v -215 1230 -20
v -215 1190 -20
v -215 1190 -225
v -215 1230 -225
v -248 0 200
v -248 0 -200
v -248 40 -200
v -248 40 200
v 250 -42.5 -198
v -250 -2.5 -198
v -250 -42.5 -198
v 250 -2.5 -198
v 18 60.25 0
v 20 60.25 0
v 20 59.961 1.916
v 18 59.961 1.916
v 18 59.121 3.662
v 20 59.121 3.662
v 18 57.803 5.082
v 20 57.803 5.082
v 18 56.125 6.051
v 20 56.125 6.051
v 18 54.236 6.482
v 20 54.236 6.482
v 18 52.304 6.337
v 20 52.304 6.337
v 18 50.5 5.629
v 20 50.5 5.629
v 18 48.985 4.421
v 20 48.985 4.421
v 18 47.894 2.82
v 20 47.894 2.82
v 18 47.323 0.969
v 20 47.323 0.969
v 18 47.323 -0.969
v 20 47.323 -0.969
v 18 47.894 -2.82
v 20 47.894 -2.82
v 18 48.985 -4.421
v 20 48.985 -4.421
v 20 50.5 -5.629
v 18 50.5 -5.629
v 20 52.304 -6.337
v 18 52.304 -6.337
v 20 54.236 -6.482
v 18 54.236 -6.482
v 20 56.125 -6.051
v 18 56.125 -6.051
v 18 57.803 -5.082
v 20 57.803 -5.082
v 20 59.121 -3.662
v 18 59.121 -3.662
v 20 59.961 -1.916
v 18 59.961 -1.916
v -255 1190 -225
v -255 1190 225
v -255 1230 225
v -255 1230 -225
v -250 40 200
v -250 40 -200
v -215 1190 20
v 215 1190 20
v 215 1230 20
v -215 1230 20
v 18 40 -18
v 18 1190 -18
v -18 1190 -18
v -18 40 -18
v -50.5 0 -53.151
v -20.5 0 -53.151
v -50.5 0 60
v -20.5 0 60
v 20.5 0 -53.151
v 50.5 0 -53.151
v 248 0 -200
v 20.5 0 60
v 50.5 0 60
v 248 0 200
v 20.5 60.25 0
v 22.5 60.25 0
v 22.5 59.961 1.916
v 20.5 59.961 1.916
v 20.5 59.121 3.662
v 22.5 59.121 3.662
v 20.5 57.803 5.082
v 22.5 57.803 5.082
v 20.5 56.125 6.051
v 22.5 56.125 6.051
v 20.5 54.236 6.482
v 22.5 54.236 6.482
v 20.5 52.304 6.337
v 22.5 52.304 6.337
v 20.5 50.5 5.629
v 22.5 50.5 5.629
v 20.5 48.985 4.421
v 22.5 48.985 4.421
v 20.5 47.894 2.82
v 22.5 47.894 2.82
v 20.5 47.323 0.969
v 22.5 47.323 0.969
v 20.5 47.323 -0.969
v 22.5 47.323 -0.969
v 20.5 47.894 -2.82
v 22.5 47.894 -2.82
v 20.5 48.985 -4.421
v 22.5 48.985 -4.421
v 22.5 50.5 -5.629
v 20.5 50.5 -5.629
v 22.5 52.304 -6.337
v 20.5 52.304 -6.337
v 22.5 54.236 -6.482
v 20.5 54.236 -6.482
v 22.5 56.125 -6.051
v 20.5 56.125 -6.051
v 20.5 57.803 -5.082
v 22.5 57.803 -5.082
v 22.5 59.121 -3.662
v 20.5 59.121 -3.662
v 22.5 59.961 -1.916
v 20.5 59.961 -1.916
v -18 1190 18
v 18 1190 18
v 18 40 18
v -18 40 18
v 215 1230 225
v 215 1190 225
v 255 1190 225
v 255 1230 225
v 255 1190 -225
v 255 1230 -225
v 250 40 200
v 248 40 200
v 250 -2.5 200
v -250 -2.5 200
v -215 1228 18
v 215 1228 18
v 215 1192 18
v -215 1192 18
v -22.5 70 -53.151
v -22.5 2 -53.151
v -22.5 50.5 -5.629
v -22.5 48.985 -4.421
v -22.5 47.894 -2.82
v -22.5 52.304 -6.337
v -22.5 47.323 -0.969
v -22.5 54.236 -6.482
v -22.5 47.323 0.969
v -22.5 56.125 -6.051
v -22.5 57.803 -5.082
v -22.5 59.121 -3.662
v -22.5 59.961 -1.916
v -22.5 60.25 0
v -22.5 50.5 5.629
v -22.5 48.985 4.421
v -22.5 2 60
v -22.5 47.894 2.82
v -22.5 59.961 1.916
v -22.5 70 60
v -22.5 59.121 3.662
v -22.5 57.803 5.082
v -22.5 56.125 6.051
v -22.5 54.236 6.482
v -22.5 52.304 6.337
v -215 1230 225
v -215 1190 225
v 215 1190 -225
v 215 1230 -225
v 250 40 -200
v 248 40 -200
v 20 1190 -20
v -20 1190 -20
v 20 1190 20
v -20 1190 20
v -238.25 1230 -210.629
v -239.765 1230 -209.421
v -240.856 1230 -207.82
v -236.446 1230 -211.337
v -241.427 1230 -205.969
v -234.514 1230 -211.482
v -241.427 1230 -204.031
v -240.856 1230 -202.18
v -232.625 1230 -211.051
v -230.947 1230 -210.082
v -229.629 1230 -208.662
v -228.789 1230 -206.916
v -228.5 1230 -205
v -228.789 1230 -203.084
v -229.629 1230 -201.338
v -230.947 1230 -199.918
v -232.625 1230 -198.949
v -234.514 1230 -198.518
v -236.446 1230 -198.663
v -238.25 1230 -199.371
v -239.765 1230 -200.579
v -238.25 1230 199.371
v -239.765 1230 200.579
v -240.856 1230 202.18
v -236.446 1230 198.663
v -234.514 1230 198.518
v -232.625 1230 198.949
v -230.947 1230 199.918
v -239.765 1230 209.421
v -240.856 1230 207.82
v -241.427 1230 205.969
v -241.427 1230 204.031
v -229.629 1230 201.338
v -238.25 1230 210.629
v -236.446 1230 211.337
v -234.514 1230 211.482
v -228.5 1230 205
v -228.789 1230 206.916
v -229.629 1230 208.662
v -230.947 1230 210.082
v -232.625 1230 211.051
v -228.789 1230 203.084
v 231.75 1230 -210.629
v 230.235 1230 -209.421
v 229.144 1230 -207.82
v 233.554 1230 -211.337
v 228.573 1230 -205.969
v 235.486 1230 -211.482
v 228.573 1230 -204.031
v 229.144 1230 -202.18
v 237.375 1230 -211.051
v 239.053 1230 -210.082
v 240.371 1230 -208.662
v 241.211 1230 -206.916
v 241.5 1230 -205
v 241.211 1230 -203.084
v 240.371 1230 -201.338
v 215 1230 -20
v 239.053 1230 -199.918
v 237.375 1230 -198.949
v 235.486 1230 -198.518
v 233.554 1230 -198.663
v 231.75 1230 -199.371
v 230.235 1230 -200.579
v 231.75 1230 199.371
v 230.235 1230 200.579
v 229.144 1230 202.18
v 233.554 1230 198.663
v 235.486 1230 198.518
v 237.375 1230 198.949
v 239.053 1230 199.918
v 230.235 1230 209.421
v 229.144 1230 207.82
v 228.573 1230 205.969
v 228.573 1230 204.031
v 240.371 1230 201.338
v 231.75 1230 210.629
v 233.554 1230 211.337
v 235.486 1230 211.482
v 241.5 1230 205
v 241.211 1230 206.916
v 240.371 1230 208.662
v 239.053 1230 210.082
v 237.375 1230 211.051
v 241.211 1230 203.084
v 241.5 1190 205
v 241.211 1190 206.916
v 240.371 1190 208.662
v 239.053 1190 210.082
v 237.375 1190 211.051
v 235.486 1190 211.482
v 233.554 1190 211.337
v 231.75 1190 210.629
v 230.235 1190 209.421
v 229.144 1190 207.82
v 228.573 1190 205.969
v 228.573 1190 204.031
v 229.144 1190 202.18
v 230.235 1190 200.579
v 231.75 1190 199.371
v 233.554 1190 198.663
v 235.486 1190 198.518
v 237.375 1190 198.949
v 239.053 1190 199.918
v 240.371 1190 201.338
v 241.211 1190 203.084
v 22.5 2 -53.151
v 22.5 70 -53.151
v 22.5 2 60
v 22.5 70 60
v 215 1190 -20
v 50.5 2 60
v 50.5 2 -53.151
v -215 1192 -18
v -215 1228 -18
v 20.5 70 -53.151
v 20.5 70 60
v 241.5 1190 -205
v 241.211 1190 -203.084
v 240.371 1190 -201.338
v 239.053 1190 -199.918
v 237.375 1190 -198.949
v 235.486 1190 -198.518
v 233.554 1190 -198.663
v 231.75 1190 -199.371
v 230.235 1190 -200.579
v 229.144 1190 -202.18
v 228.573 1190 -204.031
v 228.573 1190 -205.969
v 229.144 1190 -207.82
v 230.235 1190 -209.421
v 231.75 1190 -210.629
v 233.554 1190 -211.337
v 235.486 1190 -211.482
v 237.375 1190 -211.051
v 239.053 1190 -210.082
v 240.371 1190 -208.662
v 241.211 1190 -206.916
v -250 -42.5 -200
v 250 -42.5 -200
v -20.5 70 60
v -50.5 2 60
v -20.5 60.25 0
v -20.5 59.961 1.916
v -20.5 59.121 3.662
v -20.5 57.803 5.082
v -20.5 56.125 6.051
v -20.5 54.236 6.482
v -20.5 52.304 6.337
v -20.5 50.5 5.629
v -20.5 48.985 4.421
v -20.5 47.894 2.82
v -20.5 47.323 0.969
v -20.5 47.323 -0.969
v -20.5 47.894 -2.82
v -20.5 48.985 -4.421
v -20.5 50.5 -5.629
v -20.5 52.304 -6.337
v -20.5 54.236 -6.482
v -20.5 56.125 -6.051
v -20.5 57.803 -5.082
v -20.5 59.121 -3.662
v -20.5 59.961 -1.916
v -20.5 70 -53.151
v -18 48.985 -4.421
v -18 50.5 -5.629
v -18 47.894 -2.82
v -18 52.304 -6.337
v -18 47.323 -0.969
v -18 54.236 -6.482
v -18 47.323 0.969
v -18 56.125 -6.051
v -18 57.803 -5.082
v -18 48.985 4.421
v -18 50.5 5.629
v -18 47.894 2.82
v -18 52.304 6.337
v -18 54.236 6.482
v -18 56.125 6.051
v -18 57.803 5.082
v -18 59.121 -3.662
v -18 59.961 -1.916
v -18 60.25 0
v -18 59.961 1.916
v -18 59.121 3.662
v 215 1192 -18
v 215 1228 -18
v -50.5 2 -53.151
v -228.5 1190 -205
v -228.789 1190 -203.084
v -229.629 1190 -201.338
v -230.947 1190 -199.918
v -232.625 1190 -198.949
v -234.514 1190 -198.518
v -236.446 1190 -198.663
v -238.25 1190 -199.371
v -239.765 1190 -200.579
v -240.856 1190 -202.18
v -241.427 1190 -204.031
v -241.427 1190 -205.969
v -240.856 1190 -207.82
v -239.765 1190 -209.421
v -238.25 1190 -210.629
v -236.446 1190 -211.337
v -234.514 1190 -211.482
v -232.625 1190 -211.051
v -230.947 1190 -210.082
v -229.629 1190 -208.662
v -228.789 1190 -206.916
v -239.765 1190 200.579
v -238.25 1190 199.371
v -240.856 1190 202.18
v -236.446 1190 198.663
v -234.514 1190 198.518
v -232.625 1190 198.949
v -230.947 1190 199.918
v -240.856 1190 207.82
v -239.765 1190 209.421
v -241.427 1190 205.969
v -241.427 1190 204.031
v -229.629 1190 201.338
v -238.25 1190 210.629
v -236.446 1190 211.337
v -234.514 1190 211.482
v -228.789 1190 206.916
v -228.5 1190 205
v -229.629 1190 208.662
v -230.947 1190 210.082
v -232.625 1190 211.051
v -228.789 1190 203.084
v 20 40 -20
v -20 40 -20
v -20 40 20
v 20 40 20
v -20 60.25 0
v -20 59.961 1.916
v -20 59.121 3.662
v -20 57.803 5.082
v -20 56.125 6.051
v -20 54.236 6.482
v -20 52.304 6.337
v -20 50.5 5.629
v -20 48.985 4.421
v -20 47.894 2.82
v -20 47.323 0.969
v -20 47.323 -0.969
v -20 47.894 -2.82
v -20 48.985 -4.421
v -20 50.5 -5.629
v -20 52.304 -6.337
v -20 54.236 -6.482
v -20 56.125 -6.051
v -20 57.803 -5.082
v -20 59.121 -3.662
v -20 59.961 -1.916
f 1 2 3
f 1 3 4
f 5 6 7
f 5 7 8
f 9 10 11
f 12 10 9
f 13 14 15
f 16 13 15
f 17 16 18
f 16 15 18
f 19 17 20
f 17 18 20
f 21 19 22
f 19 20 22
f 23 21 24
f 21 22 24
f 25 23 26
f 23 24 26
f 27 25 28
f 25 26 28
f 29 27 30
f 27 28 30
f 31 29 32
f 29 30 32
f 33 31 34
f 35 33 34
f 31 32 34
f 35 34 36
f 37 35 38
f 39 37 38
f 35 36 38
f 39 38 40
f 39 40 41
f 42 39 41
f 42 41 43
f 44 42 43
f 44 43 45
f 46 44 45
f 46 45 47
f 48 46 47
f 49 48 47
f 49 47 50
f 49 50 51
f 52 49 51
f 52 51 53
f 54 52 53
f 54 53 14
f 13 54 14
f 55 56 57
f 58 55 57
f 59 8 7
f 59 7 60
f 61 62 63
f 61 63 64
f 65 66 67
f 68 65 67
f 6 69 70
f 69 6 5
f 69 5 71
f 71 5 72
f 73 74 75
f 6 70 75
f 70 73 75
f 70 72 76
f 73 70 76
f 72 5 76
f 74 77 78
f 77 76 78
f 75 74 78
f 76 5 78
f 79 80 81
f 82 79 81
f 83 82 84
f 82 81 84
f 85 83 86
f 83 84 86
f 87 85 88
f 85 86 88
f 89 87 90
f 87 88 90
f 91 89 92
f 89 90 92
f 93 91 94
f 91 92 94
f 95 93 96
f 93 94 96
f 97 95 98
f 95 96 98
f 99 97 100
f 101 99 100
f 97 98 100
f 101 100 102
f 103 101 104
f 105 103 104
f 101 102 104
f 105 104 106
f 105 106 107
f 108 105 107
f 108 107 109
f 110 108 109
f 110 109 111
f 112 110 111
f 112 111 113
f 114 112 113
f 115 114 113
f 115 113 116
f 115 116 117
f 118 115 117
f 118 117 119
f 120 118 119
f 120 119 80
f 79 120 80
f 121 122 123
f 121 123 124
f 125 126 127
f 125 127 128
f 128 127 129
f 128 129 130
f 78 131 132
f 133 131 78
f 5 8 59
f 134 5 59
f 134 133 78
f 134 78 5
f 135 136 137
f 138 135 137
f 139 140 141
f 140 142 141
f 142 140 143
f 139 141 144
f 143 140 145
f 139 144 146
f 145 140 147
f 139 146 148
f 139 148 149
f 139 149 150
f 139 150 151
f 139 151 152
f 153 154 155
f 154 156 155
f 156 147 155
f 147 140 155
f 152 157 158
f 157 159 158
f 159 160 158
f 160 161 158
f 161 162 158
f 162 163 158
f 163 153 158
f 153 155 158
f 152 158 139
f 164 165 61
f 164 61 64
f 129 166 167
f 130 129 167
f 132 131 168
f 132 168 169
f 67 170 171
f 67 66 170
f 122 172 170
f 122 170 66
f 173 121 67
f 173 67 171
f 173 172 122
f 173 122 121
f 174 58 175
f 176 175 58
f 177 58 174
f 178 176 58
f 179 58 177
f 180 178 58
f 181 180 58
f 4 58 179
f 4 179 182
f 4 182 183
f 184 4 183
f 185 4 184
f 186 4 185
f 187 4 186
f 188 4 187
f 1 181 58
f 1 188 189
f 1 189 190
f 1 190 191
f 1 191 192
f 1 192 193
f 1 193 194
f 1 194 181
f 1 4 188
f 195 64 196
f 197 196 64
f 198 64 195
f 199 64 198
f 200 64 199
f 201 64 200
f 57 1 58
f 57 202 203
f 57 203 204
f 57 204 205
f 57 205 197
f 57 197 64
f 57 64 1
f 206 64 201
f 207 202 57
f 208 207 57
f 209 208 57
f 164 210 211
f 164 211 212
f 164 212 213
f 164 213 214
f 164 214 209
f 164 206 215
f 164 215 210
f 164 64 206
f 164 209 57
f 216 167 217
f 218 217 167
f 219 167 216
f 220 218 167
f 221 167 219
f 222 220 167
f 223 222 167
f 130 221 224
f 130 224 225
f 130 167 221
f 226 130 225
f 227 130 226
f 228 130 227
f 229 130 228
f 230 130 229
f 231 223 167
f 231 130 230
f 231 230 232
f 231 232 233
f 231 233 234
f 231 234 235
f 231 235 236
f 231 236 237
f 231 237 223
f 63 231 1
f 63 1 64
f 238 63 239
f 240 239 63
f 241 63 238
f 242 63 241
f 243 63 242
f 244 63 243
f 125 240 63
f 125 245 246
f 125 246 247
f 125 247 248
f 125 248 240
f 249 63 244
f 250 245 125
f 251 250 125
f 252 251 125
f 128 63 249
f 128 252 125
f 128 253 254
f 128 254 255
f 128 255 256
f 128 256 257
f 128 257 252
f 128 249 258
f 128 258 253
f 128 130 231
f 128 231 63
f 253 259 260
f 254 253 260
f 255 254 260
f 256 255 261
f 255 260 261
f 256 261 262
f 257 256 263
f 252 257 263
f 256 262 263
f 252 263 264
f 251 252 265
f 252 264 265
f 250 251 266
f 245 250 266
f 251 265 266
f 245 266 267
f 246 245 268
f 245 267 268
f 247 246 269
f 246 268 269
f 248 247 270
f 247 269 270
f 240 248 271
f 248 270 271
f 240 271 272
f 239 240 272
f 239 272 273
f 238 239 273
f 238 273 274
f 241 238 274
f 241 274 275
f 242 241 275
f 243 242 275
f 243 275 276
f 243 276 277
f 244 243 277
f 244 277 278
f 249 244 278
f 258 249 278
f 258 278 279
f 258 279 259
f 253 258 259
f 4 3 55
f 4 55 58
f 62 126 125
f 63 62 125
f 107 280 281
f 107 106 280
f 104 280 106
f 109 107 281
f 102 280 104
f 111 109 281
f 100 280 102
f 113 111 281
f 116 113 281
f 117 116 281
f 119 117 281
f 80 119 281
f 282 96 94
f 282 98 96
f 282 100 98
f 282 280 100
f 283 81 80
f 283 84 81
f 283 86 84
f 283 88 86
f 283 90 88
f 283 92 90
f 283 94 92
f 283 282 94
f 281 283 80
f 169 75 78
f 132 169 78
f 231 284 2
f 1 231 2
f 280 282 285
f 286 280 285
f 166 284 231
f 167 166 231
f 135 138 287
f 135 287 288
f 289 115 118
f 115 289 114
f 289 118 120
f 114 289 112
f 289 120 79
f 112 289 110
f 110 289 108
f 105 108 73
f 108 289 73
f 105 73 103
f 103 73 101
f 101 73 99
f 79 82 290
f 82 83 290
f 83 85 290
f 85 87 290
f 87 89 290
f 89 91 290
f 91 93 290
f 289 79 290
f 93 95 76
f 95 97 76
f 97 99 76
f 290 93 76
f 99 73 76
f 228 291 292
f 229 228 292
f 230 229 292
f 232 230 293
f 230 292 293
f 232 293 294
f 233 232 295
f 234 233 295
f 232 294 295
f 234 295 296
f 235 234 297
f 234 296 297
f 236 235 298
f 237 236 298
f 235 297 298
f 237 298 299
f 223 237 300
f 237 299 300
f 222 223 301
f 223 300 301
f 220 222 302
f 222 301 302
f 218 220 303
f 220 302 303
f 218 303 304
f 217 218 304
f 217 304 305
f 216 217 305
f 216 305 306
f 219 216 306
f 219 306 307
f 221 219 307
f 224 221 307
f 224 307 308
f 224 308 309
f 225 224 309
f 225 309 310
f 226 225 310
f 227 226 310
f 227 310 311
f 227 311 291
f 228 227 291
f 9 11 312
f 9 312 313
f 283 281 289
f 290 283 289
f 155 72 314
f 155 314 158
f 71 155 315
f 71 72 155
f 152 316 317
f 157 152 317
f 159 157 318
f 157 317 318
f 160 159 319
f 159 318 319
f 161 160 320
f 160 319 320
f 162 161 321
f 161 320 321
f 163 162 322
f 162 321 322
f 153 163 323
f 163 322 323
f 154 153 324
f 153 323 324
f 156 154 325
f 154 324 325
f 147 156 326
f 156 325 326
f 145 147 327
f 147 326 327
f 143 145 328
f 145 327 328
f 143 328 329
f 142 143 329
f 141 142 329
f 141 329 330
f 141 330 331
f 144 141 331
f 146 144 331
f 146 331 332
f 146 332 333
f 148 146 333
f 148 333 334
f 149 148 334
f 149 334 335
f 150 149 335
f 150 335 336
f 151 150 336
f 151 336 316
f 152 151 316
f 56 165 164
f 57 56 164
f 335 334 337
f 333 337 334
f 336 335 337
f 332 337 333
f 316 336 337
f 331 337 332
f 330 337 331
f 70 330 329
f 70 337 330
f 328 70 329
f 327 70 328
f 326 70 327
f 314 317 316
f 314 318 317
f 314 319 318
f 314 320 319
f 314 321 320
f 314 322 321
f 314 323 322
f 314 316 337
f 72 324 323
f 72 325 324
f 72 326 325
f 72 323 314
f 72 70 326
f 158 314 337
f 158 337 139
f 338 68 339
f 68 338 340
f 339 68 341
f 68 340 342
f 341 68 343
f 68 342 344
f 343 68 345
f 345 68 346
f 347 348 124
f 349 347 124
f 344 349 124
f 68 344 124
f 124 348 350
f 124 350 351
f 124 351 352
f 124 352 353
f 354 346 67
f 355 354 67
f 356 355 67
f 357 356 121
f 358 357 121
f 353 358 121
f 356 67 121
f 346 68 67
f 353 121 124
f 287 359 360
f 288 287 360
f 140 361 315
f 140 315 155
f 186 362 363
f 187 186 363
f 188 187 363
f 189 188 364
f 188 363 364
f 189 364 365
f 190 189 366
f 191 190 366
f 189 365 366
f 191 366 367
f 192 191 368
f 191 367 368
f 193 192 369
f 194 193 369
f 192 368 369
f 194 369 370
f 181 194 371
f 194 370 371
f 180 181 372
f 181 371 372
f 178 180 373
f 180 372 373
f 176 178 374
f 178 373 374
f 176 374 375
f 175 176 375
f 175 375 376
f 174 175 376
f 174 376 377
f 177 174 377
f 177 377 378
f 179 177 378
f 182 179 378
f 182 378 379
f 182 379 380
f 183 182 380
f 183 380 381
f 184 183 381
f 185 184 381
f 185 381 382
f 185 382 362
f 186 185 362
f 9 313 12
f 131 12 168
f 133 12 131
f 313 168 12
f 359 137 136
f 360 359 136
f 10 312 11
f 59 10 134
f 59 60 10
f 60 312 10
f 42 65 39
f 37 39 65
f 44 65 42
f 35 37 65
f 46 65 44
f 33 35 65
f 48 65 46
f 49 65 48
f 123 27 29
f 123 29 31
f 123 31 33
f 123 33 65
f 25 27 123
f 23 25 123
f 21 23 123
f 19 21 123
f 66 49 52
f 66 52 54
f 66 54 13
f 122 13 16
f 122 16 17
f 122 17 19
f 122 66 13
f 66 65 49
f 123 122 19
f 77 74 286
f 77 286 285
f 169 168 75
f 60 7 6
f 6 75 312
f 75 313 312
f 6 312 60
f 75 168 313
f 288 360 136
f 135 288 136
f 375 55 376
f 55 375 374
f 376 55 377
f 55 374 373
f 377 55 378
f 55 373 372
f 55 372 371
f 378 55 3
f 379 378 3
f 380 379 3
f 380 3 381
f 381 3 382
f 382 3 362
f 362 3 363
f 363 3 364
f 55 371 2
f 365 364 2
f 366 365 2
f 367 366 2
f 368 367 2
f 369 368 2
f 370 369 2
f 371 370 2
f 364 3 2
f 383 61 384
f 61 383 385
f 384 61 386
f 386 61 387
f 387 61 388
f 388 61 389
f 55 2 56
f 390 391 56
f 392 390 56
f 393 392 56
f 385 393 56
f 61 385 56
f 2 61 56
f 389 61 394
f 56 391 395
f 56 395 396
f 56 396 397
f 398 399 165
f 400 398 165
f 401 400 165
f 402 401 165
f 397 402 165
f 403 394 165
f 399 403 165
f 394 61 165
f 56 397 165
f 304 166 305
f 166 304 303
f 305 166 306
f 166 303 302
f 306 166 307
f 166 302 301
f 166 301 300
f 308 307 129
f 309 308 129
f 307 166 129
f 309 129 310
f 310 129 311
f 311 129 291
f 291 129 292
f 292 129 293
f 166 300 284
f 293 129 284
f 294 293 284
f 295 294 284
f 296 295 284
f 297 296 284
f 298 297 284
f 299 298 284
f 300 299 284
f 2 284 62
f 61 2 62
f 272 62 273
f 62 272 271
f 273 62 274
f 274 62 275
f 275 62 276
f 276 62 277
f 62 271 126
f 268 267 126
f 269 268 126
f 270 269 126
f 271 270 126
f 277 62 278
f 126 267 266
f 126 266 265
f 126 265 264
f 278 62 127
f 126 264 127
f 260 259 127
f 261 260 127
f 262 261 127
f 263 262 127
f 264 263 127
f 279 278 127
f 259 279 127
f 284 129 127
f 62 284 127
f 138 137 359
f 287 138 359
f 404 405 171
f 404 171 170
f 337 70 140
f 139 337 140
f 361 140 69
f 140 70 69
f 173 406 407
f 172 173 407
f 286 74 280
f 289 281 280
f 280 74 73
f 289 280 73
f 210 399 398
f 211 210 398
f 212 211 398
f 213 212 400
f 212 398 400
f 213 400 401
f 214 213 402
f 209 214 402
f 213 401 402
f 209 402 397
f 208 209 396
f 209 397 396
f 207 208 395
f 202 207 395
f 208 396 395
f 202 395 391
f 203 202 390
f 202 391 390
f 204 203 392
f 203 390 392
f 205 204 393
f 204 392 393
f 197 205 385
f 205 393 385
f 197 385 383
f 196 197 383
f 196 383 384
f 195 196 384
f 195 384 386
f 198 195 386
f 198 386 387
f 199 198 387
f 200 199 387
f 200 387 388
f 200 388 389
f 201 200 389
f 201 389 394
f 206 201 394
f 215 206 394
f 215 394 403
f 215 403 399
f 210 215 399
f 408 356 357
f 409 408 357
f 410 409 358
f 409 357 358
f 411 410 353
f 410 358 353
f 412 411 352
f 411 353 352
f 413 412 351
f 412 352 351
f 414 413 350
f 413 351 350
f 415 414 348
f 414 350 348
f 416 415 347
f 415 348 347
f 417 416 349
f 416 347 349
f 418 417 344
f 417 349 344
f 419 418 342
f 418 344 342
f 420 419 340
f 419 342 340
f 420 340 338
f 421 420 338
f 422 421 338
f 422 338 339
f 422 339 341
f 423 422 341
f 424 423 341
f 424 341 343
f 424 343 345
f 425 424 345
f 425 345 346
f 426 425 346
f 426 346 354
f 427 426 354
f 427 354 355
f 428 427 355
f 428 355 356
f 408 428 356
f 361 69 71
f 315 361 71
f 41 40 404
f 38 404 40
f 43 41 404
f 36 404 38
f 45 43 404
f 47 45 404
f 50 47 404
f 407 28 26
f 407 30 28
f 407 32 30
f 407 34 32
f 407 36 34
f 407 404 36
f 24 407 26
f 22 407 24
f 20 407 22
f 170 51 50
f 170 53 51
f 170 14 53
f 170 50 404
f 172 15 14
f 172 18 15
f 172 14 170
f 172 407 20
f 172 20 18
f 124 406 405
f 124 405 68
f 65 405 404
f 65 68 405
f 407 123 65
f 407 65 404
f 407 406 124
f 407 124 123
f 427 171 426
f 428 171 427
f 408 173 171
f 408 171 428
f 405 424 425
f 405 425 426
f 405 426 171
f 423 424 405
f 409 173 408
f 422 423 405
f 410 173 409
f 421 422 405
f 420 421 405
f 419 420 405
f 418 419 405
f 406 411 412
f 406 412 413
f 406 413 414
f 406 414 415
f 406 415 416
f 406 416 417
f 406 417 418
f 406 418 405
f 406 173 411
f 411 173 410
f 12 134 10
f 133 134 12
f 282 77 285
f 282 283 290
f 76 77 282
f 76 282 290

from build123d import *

# Parameters (mm, degrees)
F0_W        = 500
F0_H        = 400
F1_DEPTH    = 2.5
F2_W        = 500
F2_H        = 2
F3_DEPTH    = 40
F4_W        = 2
F4_H        = 400
F5_DEPTH    = 40
F6_W        = 30
F6_H        = 113.1506699189
F7_DEPTH    = 70
F8_W        = 28
F8_H        = 68
F9_DEPTH    = 260.001
F12_DEPTH   = 40
F13_W       = 36
F13_H       = 36
F14_DEPTH   = 1151
F16_D       = 13
F16_DEPTH   = 50
F16_TIP     = 3.9055940237
F16_2_D     = 13
F16_2_DEPTH = 50
F16_2_TIP   = 3.9055940237
F18_W       = 430
F18_H       = 40
F19_DEPTH   = 40
F21_DEPTH   = 465.001
F23_W       = 40
F23_H       = 450
F24_DEPTH   = 40
F27_D       = 13
F27_DEPTH   = 50
F27_TIP     = 3.9055940237


with BuildPart() as f1:
    # F0 (on Front) → F1 (new body)
    with BuildSketch(Plane.XZ):
        Rectangle(F0_W, F0_H)
    extrude(amount=F1_DEPTH)

    # F2 (on face) → F3 (join)
    with BuildSketch(Plane.XZ.offset(2.5)):
        with Locations((0, -199)):
            Rectangle(F2_W, F2_H)
    extrude(amount=F3_DEPTH)

    # F4 (on face) → F5 (join)
    with BuildSketch(Plane(origin=(0, 0, 0), x_dir=(-1, 0, 0), z_dir=(0, 1, 0))):
        with Locations((-249, 0)):
            Rectangle(F4_W, F4_H)
        with Locations((249, 0)):
            Rectangle(F4_W, F4_H)
    extrude(amount=F5_DEPTH)

    # F6 (on face) → F7 (join)
    with BuildSketch(Plane(origin=(0, 0, 0), x_dir=(-1, 0, 0), z_dir=(0, 1, 0))):
        with Locations((-35.5, 3.4246650405)):
            Rectangle(F6_W, F6_H)
        with Locations((35.5, 3.4246650405)):
            Rectangle(F6_W, F6_H)
    extrude(amount=F7_DEPTH)

    # F8 (on face) → F9 (cut, through all)
    with BuildSketch(Plane.XY.offset(60)):
        with Locations((36.5, 36)):
            Rectangle(F8_W, F8_H)
        with Locations((-36.5, 36)):
            Rectangle(F8_W, F8_H)
    extrude(amount=-F9_DEPTH, mode=Mode.SUBTRACT)

    # F16
    with Locations(Plane(origin=(-22.5, 0, 0), x_dir=(0, -1, 0), z_dir=(-1, 0, 0))):
        with Locations((-53.75, 0)):
            Hole(F16_D / 2, depth=F16_DEPTH)
            with Locations((0, 0, -(F16_DEPTH + F16_TIP / 2))):  # 118° drill point
                Cone(0, F16_D / 2, F16_TIP, mode=Mode.SUBTRACT)


with BuildPart() as f12:
    # F11 (on offset) → F12 (new body)
    with BuildSketch(Plane.XY.offset(20)):
        Polygon((-20, 40), (0, 40), (20, 40), (20, 1190), (0, 1190), (-20, 1190), align=None)
    extrude(amount=-F12_DEPTH)

    # F13 (on face) → F14 (cut)
    with BuildSketch(Plane(origin=(0, 1190, 0), x_dir=(-1, 0, 0), z_dir=(0, 1, 0))):
        Rectangle(F13_W, F13_H)
    extrude(amount=-F14_DEPTH, mode=Mode.SUBTRACT)

    # F16#2
    with Locations(Plane(origin=(-22.5, 0, 0), x_dir=(0, -1, 0), z_dir=(-1, 0, 0))):
        with Locations((-53.75, 0)):
            Hole(F16_2_D / 2, depth=F16_2_DEPTH)
            with Locations((0, 0, -(F16_2_DEPTH + F16_2_TIP / 2))):  # 118° drill point
                Cone(0, F16_2_D / 2, F16_2_TIP, mode=Mode.SUBTRACT)


with BuildPart() as f19:
    # F18 (on offset) → F19 (new body)
    with BuildSketch(Plane(origin=(0, 1190, 0), x_dir=(-1, 0, 0), z_dir=(0, 1, 0))):
        Rectangle(F18_W, F18_H)
    extrude(amount=F19_DEPTH)

    # F20 (on face) → F21 (cut, through all)
    with BuildSketch(Plane.YZ.offset(215)):
        Polygon((1228, 18), (1192, 18), (1210, 0), align=None)
        Polygon((1210, 0), (1192, 18), (1192, -18), align=None)
        Polygon((1228, -18), (1210, 0), (1192, -18), align=None)
        Polygon((1228, 18), (1210, 0), (1228, -18), align=None)
    extrude(amount=-F21_DEPTH, mode=Mode.SUBTRACT)

    # F23 (on offset) → F24 (join)
    with BuildSketch(Plane.YZ.offset(215)):
        with Locations((1210, 0)):
            Rectangle(F23_W, F23_H)
    extrude(amount=F24_DEPTH)

    # F25: F19 across plane


with BuildPart() as f19_1:
    add(f19.part)
    add(f19.part.mirror(Plane.YZ))

    # F27
    with Locations(Plane(origin=(0, 1230, 0), x_dir=(-1, 0, 0), z_dir=(0, 1, 0))):
        with Locations((-235, 205), (235, 205), (235, -205), (-235, -205)):
            Hole(F27_D / 2, depth=F27_DEPTH)
            with Locations((0, 0, -(F27_DEPTH + F27_TIP / 2))):  # 118° drill point
                Cone(0, F27_D / 2, F27_TIP, mode=Mode.SUBTRACT)


solid = Compound([f1.part, f12.part, f19_1.part])
